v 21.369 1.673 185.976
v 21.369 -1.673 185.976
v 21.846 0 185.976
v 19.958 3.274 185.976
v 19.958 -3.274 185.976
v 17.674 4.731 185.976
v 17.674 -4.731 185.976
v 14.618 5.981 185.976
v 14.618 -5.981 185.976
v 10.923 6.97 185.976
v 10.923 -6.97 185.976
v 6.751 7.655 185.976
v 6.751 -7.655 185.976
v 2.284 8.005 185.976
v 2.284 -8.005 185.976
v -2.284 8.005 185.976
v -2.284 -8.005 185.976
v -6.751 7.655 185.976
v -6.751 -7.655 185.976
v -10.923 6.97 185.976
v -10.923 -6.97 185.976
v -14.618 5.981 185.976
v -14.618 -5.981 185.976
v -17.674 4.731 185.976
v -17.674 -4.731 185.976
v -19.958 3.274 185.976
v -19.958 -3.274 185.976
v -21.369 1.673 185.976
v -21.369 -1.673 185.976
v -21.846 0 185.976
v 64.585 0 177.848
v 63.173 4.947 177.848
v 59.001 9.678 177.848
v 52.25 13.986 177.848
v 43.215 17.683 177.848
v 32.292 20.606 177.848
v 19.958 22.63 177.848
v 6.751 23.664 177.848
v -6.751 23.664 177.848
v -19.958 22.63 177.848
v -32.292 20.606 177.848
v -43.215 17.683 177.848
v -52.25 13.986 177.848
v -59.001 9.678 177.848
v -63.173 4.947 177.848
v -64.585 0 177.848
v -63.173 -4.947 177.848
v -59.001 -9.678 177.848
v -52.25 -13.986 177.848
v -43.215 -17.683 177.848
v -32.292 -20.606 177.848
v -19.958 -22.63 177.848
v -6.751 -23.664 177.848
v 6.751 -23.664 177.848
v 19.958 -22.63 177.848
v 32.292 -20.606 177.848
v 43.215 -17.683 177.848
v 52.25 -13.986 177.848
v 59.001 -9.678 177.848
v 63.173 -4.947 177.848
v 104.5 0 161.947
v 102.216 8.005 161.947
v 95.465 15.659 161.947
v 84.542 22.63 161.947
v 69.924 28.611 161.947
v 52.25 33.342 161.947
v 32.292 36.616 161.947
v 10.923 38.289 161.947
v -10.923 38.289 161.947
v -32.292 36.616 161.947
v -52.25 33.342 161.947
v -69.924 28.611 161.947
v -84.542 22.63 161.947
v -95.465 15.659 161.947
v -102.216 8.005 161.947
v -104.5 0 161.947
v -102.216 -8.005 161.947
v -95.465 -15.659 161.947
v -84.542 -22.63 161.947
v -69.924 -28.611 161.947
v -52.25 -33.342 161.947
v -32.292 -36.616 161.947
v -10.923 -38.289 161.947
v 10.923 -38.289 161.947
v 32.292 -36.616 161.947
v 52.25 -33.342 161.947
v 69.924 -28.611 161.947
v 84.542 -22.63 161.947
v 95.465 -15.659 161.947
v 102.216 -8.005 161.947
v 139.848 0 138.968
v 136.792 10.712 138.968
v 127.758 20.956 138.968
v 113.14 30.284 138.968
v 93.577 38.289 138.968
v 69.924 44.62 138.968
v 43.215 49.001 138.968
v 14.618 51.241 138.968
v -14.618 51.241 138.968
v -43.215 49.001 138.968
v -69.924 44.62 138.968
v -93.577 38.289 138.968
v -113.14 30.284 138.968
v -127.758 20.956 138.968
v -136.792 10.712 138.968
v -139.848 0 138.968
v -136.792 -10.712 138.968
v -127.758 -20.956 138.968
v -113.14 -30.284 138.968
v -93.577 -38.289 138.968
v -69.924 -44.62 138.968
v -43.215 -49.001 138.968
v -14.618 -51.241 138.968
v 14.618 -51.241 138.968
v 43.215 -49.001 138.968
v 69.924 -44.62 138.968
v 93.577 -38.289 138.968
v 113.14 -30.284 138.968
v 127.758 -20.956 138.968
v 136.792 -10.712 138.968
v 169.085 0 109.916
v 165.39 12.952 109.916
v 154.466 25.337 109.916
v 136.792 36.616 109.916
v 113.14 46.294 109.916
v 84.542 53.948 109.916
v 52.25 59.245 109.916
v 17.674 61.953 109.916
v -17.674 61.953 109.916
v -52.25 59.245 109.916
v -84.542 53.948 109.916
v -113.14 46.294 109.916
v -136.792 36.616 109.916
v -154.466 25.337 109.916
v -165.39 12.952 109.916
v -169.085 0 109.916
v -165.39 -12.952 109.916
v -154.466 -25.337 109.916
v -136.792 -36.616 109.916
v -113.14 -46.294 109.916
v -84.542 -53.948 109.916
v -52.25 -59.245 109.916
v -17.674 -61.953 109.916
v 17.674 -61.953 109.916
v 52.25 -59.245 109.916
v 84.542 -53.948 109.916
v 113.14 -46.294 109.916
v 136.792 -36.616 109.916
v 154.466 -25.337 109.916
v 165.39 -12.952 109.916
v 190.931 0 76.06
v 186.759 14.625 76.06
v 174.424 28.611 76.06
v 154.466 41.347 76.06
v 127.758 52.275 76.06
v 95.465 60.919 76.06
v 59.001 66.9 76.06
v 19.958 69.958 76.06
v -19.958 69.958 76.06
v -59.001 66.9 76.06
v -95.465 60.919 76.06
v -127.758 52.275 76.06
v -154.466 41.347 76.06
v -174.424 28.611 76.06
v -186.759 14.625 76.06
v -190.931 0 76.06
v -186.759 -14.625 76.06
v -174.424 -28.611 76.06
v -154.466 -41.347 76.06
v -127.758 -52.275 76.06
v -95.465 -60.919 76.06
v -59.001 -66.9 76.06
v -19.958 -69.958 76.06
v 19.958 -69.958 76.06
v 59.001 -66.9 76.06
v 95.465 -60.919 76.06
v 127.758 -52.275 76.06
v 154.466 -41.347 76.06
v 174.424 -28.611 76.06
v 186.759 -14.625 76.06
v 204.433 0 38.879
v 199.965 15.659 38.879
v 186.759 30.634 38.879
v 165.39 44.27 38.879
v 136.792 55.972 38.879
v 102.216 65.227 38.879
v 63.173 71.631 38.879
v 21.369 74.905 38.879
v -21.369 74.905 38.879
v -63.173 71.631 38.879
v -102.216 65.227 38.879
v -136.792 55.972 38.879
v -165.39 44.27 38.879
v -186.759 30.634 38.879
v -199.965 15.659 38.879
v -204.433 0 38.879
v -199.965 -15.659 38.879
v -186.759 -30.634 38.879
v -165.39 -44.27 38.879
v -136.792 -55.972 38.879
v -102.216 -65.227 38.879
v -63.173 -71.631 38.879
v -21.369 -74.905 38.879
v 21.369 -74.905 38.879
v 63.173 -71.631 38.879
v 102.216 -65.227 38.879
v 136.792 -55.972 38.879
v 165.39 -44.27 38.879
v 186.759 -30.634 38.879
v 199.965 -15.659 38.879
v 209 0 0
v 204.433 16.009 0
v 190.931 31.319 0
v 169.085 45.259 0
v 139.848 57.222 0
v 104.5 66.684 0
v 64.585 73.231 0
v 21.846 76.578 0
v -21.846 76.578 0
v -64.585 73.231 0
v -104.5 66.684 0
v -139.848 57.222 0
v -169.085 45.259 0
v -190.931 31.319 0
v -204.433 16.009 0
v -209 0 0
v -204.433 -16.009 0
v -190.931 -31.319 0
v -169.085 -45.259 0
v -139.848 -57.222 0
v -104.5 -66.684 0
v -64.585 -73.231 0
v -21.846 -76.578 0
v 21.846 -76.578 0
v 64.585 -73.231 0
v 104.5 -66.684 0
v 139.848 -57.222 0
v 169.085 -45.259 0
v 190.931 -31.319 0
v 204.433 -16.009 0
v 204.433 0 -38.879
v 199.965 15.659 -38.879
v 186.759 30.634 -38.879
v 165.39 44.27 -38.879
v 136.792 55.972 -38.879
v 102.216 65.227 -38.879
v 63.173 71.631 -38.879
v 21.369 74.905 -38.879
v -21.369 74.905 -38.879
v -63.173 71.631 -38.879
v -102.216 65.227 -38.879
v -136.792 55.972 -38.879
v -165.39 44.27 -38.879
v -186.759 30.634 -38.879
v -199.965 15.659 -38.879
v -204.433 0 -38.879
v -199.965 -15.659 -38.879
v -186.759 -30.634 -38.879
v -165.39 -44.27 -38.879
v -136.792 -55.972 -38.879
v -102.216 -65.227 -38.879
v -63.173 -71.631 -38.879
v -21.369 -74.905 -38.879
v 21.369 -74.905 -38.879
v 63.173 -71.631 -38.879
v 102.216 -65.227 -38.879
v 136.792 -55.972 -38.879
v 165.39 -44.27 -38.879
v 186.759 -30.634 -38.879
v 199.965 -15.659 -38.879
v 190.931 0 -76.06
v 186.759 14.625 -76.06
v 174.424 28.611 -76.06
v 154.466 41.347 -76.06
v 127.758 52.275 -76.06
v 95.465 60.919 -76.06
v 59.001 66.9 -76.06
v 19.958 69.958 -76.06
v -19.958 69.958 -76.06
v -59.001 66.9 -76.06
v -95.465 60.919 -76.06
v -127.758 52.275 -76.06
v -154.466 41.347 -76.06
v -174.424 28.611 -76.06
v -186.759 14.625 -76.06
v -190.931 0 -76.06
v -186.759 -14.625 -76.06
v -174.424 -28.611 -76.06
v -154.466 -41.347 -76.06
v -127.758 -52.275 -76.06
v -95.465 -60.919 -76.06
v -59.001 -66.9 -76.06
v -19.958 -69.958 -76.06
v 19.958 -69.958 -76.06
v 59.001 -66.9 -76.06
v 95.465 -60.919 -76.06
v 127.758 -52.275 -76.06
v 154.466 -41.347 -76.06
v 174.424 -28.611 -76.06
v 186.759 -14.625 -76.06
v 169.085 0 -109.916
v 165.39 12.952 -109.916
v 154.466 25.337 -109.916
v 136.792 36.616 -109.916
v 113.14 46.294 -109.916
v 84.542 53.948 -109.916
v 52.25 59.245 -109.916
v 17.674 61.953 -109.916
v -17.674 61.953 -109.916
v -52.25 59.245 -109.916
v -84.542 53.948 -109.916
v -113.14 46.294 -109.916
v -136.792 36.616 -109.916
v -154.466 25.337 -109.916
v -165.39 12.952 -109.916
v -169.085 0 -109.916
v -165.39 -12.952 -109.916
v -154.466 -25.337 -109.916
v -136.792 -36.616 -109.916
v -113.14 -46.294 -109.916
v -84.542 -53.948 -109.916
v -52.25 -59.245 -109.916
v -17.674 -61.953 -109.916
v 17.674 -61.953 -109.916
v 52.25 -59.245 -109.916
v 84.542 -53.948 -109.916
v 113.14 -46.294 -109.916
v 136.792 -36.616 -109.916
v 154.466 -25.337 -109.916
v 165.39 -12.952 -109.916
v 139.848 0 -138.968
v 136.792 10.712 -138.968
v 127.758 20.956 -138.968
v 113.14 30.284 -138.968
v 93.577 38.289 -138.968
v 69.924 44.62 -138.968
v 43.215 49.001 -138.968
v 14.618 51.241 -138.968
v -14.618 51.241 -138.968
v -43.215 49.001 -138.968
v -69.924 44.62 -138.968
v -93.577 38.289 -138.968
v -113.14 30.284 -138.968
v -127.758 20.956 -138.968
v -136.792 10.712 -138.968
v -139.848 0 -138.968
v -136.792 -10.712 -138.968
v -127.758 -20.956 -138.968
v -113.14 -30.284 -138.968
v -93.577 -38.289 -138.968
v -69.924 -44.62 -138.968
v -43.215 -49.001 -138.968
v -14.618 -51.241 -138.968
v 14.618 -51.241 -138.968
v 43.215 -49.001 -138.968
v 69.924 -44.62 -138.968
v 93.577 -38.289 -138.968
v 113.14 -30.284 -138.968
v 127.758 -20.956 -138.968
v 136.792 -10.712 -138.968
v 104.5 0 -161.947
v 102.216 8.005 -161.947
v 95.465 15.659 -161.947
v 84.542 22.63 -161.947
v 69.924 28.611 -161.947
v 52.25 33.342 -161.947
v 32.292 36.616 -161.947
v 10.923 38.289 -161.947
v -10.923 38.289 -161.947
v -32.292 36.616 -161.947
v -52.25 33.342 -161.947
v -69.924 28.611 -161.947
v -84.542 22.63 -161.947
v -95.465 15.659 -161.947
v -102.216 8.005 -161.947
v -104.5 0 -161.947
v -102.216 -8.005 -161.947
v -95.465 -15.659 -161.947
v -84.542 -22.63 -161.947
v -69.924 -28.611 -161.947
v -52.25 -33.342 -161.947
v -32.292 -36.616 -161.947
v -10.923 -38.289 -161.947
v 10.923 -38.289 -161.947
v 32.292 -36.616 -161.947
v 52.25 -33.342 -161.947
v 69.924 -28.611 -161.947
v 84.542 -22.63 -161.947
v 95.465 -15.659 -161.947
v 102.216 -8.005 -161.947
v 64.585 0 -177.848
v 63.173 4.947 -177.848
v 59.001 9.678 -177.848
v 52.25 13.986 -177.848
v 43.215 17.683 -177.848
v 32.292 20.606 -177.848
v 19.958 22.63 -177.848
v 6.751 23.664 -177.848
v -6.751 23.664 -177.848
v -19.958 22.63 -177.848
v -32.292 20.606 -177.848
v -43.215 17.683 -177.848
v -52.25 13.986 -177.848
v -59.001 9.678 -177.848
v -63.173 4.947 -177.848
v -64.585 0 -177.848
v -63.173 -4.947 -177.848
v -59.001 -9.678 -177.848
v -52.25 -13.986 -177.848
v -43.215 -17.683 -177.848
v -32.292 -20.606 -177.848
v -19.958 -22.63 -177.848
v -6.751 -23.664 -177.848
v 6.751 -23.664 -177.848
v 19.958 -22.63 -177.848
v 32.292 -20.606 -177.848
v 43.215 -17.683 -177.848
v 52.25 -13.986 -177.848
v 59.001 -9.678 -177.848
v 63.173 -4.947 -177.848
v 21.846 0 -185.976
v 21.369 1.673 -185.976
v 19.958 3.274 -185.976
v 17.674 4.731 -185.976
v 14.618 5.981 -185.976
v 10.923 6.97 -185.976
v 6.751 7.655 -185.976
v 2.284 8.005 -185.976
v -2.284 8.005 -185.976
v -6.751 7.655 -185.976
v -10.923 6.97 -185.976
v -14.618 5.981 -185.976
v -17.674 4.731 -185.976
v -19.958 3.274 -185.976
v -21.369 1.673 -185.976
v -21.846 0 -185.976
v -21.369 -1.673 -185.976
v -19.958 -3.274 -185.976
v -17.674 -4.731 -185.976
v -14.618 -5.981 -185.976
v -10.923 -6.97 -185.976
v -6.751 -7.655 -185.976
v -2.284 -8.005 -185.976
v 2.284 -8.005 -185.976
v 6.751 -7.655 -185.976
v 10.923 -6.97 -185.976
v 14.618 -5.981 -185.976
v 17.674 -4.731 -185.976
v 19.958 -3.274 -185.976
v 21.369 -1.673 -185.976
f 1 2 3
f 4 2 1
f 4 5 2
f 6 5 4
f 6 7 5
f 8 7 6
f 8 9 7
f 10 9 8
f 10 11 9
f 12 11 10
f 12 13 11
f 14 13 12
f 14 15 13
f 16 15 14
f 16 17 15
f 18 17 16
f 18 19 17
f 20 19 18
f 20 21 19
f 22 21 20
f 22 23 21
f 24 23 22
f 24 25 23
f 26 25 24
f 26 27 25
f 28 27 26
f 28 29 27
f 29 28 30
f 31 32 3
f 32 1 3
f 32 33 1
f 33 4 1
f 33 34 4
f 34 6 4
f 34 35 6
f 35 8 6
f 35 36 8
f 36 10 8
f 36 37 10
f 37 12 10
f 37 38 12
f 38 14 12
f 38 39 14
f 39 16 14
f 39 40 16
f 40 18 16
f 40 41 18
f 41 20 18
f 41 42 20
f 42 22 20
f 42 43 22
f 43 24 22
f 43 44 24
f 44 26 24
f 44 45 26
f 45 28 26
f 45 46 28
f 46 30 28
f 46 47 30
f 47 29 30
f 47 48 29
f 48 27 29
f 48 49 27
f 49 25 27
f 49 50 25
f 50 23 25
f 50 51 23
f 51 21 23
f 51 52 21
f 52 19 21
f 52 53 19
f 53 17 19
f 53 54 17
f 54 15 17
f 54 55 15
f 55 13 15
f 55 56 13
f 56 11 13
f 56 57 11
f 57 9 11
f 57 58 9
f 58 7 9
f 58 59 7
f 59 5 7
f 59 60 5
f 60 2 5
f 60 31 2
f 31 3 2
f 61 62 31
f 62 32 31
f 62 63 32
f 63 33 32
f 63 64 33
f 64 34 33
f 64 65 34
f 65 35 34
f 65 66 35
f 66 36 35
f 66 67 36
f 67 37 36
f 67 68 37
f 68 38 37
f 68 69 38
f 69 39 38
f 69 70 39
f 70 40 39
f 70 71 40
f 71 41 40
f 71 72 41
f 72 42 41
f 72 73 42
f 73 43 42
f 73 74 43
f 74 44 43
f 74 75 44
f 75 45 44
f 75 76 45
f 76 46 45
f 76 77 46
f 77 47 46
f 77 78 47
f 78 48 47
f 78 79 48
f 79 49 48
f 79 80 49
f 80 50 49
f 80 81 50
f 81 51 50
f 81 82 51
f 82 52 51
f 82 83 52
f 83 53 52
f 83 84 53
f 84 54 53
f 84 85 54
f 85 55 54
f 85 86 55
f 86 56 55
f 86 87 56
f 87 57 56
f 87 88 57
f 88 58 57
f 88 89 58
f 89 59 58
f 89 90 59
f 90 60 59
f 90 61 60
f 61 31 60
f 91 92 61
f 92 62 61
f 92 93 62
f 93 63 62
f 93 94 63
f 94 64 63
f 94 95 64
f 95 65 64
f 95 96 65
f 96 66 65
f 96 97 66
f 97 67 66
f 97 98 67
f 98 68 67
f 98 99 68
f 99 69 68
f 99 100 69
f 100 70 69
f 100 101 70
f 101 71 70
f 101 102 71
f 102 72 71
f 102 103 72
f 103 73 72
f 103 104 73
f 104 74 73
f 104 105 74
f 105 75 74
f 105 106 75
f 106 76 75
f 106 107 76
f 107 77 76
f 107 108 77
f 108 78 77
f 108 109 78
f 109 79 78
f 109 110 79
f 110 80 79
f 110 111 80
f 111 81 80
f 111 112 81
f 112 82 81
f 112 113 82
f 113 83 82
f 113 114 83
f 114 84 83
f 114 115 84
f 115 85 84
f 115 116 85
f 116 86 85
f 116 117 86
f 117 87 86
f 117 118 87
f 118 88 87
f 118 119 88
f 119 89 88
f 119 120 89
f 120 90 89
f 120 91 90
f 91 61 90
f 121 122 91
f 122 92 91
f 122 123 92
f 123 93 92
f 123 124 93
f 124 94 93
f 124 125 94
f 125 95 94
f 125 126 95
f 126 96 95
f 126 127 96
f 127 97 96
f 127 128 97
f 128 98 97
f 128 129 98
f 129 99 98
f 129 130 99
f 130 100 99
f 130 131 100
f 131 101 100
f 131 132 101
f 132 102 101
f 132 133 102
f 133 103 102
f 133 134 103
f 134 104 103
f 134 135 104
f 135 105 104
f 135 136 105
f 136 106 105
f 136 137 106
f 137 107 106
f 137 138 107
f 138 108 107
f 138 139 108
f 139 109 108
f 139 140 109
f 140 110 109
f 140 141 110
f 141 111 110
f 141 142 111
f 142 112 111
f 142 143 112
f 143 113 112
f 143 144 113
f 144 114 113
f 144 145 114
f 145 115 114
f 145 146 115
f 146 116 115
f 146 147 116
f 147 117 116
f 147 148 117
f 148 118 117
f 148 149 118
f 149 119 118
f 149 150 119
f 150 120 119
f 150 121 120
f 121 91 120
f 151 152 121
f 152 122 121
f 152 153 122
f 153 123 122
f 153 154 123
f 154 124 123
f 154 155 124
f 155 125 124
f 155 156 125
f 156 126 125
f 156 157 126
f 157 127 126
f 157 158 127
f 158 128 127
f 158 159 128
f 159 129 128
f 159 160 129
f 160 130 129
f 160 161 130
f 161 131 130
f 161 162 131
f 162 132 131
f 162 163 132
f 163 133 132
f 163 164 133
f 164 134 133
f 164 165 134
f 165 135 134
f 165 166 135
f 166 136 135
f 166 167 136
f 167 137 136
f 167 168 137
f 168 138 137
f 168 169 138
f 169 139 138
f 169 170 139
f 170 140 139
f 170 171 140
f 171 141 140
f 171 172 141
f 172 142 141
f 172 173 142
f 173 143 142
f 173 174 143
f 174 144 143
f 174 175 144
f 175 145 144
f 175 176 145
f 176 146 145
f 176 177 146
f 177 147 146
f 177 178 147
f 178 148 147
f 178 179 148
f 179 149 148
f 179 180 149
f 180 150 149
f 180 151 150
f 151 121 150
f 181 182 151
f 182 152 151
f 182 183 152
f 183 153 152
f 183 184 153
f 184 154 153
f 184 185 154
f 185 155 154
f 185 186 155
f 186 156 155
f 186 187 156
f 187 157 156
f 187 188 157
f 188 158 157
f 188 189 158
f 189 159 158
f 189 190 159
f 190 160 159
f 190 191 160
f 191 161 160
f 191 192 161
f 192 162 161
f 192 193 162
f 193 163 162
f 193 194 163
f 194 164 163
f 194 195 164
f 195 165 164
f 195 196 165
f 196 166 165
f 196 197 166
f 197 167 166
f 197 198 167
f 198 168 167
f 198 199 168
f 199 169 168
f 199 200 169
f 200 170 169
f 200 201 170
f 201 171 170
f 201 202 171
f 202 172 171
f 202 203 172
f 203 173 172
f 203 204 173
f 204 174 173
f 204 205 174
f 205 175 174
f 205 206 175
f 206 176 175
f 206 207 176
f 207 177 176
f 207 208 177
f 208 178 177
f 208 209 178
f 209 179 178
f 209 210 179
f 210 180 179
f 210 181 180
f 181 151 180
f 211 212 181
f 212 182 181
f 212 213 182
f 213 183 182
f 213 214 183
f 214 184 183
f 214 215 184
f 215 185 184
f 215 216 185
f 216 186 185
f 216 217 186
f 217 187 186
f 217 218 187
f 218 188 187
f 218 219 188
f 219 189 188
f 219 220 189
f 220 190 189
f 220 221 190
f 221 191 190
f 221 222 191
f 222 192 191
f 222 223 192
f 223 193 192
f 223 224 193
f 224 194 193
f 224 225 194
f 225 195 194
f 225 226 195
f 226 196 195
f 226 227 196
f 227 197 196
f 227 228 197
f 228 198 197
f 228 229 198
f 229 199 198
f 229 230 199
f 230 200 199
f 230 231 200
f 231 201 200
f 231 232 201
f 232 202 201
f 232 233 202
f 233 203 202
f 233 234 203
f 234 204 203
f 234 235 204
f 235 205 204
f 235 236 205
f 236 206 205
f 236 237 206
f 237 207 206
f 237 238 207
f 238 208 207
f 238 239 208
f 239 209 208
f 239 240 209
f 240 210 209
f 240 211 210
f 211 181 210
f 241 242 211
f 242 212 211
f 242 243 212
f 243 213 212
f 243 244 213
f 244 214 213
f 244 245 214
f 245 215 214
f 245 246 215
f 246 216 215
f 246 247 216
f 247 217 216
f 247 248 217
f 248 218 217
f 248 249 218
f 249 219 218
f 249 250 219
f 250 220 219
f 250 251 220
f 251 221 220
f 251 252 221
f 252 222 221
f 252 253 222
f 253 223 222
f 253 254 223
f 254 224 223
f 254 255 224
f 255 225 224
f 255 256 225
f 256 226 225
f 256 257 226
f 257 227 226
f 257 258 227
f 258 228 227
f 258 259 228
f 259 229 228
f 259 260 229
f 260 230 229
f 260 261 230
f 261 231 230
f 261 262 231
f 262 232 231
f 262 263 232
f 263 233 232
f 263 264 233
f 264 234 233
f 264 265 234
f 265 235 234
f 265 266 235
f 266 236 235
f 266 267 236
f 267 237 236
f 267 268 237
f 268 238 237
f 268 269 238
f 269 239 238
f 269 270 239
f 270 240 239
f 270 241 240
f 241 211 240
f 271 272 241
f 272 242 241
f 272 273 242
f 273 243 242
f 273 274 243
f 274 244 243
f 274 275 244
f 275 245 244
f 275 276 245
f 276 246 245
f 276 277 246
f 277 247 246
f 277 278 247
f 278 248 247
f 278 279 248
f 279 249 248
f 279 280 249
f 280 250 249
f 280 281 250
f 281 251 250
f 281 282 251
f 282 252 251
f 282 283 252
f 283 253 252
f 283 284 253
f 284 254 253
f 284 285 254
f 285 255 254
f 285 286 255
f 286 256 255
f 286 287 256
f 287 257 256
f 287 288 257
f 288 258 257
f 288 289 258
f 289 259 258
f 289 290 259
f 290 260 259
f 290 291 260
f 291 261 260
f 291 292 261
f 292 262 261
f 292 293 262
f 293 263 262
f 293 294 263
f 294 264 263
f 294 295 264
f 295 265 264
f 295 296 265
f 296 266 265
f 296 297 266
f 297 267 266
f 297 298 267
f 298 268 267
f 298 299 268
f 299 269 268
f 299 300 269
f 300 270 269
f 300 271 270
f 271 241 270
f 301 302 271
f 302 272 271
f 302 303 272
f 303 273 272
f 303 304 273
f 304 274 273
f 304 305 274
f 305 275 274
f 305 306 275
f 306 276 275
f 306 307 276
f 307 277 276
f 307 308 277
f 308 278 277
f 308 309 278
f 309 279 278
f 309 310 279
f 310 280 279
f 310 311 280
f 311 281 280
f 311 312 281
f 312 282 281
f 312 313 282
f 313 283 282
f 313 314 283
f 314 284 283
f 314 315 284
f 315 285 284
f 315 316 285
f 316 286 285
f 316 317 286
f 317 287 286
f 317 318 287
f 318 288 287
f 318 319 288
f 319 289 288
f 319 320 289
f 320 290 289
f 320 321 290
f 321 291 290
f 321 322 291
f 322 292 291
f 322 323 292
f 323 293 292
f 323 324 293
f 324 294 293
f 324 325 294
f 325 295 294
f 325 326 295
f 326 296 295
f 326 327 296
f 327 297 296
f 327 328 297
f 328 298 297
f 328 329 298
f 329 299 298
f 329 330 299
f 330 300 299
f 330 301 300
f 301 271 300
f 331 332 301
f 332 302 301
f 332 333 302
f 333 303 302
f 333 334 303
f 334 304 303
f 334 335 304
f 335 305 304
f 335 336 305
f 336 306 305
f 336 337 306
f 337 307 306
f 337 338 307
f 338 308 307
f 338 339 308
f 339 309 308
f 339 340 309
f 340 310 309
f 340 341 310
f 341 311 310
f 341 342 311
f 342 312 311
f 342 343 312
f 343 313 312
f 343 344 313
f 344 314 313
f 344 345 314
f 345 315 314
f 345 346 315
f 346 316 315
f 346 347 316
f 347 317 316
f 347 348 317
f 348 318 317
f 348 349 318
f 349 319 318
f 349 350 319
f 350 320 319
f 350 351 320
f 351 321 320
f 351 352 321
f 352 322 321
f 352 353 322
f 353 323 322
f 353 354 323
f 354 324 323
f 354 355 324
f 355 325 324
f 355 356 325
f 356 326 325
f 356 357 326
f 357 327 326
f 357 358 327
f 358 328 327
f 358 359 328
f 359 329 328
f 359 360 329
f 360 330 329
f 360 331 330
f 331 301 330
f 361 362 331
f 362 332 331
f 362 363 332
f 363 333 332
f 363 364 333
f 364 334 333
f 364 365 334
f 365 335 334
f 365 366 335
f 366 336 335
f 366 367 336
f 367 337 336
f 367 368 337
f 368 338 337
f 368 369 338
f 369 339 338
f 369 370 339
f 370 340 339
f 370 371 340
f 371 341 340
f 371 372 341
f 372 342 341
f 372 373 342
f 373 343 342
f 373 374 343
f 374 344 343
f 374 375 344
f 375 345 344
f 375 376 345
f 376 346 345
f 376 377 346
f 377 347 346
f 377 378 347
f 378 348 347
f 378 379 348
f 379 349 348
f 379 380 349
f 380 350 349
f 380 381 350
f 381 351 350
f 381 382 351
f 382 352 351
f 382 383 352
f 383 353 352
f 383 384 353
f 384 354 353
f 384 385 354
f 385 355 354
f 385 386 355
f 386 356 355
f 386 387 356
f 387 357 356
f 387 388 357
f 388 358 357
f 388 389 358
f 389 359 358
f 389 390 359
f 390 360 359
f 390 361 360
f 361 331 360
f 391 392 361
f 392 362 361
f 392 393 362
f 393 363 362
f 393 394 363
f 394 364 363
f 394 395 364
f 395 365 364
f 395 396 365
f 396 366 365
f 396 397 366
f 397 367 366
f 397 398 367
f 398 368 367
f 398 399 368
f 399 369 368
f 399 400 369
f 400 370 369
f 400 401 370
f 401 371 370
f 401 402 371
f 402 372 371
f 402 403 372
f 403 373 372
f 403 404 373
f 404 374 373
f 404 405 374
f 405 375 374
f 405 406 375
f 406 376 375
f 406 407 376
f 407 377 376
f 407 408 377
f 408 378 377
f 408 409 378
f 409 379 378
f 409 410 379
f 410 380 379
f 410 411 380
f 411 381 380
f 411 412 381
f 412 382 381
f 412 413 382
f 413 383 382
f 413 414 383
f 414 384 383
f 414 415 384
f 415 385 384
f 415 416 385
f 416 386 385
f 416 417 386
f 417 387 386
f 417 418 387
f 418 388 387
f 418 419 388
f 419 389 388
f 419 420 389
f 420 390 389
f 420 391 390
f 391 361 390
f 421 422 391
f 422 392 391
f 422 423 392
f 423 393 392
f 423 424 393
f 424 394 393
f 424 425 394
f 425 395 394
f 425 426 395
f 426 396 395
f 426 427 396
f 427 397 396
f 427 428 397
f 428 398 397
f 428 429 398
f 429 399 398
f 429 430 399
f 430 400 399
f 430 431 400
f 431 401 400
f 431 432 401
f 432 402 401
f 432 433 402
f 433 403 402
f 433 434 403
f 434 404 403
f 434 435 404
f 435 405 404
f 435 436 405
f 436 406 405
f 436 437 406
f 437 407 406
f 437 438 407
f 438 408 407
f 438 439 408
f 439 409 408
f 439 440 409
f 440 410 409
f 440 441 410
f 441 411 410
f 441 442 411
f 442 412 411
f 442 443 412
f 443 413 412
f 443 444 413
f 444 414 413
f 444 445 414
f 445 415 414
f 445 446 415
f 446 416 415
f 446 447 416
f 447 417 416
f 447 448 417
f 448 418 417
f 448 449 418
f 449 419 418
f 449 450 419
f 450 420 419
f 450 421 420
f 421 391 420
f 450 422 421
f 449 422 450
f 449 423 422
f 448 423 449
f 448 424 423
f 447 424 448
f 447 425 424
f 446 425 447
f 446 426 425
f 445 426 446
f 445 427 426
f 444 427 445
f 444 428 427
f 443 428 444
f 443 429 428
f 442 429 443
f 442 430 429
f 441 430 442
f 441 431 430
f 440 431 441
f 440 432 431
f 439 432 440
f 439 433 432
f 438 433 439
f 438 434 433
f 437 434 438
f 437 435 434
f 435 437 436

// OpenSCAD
// Generated by SolidPython 1.0.1 on 2020-07-29 00:46:53


scale(v = [19, 7, 17]) {
	sphere(r = 11);
}
/***********************************************
*********      SolidPython code:      **********
************************************************
 
# import packages: SolidPython
from solid import *
from solid.utils import *
from itertools import chain, combinations, permutations


class Resize:

    def __init__(self, scad_file):
        self.scad_file = scad_file
        #self.scad_file = import_scad(scad_file)
        # cone/cylinder param:
        self.r1 = 0
        self.r2 = 0
        self.h = 0
        # rectangular prism param:
        self.w = 0
        self.l = 0
        # ellipse param:
        self.r = 0

    # import OpenScad code (file name corresponds to shape)


    # classify shape + parameters
    def assign(self, param1, param2, param3):
        if self.scad_file == 'cone.scad':
            self.r1 = param1
            self.r2 = param2
            self.h = param3
        elif self.scad_file == 'cylinder.scad':
            self.r1 = param1
            self.r2 = param2
            self.h = param3
        elif self.scad_file == 'rectangularPrism.scad':
            self.h = param1
            self.l = param2
            self.w = param3
        else:
            self.r = param1
            self.h = param2

    # resize parameters
    def iterate(self):
        x = range(3, 20, 2)
        i = 1
        if self.scad_file == 'cone.scad':
            tempList = list(permutations(x, 2))
            for temp in tempList:
                param1 = temp[0]
                param2 = temp[1]
                filepath = 'produced_scad_files/' + 'cone' + str(param1) + '_' + str(param2) + '_' + '.scad'
                scad_render_to_file(cylinder(h=param1, r1=param2, r2=0), filepath)

        elif self.scad_file == 'cylinder.scad':
            tempList = list(permutations(x, 3))
            for temp in tempList:
                param1 = temp[0]
                param2 = temp[1]
                filepath = 'produced_scad_files/' + 'cylinder' + str(param1) + '_' + str(param2) + '_' + '.scad'
                scad_render_to_file(cylinder(h=param1, r1=param2, r2=param2), filepath)

        elif self.scad_file == 'rectangularPrism.scad':
            tempList = list(permutations(x, 3))
            for temp in tempList:
                param1 = temp[0]
                param2 = temp[1]
                param3 = temp[2]
                filepath = 'produced_scad_files/' + 'rectangularPrism' + str(param1) + '_' + str(param2) + '_' + str(
                    param3) + '.scad'
                scad_render_to_file(cube(size=(param1, param2, param3)), filepath)

        elif self.scad_file == 'ellipse.scad':
            tempList = list(permutations(x, 4))
            for temp in tempList:
                param1 = temp[0]
                param2 = temp[1]
                param3 = temp[2]
                param4 = temp[3]
                filepath = 'produced_scad_files/' + 'ellipse' + str(param1) + '_' + str(param2) + '_' + str(param3) + '_' + str(param4) + '.scad'
                scad_render_to_file(scale([param1, param2, param3])(sphere(r=param4)), filepath)

    def render_to_scadfile(self):
        scad_render_to_file(scad, 'example.scad') 
 
************************************************/
